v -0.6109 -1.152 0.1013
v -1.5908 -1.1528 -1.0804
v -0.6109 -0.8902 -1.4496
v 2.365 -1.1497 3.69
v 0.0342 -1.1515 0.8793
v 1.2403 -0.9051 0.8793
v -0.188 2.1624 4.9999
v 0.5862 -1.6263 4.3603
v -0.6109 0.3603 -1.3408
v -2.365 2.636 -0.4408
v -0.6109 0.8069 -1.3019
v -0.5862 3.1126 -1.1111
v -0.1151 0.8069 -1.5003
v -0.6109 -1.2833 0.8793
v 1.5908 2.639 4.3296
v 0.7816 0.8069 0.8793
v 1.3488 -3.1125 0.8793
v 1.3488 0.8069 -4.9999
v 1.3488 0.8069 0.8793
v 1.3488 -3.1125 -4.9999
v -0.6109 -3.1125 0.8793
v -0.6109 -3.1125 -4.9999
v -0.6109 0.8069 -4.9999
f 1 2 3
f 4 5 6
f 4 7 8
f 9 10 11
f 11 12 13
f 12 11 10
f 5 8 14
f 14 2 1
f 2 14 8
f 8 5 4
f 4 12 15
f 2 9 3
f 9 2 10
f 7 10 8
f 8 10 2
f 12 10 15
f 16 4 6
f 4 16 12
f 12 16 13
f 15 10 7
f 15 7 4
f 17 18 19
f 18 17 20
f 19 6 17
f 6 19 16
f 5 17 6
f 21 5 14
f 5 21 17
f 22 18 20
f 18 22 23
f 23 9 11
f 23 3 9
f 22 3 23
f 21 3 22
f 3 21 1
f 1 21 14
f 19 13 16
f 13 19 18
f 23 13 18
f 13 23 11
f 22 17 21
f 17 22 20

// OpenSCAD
intersection() {
  translate([5e-06, -5e-06, 0])
  cube(size = [5.67603, 7.4701, 11.9999], center = true);

  union() {
    union() {
      translate([-1.55451e-05, 0.743113, 1.62462])
      rotate([100, 20.0001, 15])
      cube(size = [1.9597, 5.87917, 3.91953], center = true);
    
      translate([0.36893, -1.15281, -2.06032])
      cube(size = [1.95968, 3.91947, 5.87925], center = true);
    }
  }
}
